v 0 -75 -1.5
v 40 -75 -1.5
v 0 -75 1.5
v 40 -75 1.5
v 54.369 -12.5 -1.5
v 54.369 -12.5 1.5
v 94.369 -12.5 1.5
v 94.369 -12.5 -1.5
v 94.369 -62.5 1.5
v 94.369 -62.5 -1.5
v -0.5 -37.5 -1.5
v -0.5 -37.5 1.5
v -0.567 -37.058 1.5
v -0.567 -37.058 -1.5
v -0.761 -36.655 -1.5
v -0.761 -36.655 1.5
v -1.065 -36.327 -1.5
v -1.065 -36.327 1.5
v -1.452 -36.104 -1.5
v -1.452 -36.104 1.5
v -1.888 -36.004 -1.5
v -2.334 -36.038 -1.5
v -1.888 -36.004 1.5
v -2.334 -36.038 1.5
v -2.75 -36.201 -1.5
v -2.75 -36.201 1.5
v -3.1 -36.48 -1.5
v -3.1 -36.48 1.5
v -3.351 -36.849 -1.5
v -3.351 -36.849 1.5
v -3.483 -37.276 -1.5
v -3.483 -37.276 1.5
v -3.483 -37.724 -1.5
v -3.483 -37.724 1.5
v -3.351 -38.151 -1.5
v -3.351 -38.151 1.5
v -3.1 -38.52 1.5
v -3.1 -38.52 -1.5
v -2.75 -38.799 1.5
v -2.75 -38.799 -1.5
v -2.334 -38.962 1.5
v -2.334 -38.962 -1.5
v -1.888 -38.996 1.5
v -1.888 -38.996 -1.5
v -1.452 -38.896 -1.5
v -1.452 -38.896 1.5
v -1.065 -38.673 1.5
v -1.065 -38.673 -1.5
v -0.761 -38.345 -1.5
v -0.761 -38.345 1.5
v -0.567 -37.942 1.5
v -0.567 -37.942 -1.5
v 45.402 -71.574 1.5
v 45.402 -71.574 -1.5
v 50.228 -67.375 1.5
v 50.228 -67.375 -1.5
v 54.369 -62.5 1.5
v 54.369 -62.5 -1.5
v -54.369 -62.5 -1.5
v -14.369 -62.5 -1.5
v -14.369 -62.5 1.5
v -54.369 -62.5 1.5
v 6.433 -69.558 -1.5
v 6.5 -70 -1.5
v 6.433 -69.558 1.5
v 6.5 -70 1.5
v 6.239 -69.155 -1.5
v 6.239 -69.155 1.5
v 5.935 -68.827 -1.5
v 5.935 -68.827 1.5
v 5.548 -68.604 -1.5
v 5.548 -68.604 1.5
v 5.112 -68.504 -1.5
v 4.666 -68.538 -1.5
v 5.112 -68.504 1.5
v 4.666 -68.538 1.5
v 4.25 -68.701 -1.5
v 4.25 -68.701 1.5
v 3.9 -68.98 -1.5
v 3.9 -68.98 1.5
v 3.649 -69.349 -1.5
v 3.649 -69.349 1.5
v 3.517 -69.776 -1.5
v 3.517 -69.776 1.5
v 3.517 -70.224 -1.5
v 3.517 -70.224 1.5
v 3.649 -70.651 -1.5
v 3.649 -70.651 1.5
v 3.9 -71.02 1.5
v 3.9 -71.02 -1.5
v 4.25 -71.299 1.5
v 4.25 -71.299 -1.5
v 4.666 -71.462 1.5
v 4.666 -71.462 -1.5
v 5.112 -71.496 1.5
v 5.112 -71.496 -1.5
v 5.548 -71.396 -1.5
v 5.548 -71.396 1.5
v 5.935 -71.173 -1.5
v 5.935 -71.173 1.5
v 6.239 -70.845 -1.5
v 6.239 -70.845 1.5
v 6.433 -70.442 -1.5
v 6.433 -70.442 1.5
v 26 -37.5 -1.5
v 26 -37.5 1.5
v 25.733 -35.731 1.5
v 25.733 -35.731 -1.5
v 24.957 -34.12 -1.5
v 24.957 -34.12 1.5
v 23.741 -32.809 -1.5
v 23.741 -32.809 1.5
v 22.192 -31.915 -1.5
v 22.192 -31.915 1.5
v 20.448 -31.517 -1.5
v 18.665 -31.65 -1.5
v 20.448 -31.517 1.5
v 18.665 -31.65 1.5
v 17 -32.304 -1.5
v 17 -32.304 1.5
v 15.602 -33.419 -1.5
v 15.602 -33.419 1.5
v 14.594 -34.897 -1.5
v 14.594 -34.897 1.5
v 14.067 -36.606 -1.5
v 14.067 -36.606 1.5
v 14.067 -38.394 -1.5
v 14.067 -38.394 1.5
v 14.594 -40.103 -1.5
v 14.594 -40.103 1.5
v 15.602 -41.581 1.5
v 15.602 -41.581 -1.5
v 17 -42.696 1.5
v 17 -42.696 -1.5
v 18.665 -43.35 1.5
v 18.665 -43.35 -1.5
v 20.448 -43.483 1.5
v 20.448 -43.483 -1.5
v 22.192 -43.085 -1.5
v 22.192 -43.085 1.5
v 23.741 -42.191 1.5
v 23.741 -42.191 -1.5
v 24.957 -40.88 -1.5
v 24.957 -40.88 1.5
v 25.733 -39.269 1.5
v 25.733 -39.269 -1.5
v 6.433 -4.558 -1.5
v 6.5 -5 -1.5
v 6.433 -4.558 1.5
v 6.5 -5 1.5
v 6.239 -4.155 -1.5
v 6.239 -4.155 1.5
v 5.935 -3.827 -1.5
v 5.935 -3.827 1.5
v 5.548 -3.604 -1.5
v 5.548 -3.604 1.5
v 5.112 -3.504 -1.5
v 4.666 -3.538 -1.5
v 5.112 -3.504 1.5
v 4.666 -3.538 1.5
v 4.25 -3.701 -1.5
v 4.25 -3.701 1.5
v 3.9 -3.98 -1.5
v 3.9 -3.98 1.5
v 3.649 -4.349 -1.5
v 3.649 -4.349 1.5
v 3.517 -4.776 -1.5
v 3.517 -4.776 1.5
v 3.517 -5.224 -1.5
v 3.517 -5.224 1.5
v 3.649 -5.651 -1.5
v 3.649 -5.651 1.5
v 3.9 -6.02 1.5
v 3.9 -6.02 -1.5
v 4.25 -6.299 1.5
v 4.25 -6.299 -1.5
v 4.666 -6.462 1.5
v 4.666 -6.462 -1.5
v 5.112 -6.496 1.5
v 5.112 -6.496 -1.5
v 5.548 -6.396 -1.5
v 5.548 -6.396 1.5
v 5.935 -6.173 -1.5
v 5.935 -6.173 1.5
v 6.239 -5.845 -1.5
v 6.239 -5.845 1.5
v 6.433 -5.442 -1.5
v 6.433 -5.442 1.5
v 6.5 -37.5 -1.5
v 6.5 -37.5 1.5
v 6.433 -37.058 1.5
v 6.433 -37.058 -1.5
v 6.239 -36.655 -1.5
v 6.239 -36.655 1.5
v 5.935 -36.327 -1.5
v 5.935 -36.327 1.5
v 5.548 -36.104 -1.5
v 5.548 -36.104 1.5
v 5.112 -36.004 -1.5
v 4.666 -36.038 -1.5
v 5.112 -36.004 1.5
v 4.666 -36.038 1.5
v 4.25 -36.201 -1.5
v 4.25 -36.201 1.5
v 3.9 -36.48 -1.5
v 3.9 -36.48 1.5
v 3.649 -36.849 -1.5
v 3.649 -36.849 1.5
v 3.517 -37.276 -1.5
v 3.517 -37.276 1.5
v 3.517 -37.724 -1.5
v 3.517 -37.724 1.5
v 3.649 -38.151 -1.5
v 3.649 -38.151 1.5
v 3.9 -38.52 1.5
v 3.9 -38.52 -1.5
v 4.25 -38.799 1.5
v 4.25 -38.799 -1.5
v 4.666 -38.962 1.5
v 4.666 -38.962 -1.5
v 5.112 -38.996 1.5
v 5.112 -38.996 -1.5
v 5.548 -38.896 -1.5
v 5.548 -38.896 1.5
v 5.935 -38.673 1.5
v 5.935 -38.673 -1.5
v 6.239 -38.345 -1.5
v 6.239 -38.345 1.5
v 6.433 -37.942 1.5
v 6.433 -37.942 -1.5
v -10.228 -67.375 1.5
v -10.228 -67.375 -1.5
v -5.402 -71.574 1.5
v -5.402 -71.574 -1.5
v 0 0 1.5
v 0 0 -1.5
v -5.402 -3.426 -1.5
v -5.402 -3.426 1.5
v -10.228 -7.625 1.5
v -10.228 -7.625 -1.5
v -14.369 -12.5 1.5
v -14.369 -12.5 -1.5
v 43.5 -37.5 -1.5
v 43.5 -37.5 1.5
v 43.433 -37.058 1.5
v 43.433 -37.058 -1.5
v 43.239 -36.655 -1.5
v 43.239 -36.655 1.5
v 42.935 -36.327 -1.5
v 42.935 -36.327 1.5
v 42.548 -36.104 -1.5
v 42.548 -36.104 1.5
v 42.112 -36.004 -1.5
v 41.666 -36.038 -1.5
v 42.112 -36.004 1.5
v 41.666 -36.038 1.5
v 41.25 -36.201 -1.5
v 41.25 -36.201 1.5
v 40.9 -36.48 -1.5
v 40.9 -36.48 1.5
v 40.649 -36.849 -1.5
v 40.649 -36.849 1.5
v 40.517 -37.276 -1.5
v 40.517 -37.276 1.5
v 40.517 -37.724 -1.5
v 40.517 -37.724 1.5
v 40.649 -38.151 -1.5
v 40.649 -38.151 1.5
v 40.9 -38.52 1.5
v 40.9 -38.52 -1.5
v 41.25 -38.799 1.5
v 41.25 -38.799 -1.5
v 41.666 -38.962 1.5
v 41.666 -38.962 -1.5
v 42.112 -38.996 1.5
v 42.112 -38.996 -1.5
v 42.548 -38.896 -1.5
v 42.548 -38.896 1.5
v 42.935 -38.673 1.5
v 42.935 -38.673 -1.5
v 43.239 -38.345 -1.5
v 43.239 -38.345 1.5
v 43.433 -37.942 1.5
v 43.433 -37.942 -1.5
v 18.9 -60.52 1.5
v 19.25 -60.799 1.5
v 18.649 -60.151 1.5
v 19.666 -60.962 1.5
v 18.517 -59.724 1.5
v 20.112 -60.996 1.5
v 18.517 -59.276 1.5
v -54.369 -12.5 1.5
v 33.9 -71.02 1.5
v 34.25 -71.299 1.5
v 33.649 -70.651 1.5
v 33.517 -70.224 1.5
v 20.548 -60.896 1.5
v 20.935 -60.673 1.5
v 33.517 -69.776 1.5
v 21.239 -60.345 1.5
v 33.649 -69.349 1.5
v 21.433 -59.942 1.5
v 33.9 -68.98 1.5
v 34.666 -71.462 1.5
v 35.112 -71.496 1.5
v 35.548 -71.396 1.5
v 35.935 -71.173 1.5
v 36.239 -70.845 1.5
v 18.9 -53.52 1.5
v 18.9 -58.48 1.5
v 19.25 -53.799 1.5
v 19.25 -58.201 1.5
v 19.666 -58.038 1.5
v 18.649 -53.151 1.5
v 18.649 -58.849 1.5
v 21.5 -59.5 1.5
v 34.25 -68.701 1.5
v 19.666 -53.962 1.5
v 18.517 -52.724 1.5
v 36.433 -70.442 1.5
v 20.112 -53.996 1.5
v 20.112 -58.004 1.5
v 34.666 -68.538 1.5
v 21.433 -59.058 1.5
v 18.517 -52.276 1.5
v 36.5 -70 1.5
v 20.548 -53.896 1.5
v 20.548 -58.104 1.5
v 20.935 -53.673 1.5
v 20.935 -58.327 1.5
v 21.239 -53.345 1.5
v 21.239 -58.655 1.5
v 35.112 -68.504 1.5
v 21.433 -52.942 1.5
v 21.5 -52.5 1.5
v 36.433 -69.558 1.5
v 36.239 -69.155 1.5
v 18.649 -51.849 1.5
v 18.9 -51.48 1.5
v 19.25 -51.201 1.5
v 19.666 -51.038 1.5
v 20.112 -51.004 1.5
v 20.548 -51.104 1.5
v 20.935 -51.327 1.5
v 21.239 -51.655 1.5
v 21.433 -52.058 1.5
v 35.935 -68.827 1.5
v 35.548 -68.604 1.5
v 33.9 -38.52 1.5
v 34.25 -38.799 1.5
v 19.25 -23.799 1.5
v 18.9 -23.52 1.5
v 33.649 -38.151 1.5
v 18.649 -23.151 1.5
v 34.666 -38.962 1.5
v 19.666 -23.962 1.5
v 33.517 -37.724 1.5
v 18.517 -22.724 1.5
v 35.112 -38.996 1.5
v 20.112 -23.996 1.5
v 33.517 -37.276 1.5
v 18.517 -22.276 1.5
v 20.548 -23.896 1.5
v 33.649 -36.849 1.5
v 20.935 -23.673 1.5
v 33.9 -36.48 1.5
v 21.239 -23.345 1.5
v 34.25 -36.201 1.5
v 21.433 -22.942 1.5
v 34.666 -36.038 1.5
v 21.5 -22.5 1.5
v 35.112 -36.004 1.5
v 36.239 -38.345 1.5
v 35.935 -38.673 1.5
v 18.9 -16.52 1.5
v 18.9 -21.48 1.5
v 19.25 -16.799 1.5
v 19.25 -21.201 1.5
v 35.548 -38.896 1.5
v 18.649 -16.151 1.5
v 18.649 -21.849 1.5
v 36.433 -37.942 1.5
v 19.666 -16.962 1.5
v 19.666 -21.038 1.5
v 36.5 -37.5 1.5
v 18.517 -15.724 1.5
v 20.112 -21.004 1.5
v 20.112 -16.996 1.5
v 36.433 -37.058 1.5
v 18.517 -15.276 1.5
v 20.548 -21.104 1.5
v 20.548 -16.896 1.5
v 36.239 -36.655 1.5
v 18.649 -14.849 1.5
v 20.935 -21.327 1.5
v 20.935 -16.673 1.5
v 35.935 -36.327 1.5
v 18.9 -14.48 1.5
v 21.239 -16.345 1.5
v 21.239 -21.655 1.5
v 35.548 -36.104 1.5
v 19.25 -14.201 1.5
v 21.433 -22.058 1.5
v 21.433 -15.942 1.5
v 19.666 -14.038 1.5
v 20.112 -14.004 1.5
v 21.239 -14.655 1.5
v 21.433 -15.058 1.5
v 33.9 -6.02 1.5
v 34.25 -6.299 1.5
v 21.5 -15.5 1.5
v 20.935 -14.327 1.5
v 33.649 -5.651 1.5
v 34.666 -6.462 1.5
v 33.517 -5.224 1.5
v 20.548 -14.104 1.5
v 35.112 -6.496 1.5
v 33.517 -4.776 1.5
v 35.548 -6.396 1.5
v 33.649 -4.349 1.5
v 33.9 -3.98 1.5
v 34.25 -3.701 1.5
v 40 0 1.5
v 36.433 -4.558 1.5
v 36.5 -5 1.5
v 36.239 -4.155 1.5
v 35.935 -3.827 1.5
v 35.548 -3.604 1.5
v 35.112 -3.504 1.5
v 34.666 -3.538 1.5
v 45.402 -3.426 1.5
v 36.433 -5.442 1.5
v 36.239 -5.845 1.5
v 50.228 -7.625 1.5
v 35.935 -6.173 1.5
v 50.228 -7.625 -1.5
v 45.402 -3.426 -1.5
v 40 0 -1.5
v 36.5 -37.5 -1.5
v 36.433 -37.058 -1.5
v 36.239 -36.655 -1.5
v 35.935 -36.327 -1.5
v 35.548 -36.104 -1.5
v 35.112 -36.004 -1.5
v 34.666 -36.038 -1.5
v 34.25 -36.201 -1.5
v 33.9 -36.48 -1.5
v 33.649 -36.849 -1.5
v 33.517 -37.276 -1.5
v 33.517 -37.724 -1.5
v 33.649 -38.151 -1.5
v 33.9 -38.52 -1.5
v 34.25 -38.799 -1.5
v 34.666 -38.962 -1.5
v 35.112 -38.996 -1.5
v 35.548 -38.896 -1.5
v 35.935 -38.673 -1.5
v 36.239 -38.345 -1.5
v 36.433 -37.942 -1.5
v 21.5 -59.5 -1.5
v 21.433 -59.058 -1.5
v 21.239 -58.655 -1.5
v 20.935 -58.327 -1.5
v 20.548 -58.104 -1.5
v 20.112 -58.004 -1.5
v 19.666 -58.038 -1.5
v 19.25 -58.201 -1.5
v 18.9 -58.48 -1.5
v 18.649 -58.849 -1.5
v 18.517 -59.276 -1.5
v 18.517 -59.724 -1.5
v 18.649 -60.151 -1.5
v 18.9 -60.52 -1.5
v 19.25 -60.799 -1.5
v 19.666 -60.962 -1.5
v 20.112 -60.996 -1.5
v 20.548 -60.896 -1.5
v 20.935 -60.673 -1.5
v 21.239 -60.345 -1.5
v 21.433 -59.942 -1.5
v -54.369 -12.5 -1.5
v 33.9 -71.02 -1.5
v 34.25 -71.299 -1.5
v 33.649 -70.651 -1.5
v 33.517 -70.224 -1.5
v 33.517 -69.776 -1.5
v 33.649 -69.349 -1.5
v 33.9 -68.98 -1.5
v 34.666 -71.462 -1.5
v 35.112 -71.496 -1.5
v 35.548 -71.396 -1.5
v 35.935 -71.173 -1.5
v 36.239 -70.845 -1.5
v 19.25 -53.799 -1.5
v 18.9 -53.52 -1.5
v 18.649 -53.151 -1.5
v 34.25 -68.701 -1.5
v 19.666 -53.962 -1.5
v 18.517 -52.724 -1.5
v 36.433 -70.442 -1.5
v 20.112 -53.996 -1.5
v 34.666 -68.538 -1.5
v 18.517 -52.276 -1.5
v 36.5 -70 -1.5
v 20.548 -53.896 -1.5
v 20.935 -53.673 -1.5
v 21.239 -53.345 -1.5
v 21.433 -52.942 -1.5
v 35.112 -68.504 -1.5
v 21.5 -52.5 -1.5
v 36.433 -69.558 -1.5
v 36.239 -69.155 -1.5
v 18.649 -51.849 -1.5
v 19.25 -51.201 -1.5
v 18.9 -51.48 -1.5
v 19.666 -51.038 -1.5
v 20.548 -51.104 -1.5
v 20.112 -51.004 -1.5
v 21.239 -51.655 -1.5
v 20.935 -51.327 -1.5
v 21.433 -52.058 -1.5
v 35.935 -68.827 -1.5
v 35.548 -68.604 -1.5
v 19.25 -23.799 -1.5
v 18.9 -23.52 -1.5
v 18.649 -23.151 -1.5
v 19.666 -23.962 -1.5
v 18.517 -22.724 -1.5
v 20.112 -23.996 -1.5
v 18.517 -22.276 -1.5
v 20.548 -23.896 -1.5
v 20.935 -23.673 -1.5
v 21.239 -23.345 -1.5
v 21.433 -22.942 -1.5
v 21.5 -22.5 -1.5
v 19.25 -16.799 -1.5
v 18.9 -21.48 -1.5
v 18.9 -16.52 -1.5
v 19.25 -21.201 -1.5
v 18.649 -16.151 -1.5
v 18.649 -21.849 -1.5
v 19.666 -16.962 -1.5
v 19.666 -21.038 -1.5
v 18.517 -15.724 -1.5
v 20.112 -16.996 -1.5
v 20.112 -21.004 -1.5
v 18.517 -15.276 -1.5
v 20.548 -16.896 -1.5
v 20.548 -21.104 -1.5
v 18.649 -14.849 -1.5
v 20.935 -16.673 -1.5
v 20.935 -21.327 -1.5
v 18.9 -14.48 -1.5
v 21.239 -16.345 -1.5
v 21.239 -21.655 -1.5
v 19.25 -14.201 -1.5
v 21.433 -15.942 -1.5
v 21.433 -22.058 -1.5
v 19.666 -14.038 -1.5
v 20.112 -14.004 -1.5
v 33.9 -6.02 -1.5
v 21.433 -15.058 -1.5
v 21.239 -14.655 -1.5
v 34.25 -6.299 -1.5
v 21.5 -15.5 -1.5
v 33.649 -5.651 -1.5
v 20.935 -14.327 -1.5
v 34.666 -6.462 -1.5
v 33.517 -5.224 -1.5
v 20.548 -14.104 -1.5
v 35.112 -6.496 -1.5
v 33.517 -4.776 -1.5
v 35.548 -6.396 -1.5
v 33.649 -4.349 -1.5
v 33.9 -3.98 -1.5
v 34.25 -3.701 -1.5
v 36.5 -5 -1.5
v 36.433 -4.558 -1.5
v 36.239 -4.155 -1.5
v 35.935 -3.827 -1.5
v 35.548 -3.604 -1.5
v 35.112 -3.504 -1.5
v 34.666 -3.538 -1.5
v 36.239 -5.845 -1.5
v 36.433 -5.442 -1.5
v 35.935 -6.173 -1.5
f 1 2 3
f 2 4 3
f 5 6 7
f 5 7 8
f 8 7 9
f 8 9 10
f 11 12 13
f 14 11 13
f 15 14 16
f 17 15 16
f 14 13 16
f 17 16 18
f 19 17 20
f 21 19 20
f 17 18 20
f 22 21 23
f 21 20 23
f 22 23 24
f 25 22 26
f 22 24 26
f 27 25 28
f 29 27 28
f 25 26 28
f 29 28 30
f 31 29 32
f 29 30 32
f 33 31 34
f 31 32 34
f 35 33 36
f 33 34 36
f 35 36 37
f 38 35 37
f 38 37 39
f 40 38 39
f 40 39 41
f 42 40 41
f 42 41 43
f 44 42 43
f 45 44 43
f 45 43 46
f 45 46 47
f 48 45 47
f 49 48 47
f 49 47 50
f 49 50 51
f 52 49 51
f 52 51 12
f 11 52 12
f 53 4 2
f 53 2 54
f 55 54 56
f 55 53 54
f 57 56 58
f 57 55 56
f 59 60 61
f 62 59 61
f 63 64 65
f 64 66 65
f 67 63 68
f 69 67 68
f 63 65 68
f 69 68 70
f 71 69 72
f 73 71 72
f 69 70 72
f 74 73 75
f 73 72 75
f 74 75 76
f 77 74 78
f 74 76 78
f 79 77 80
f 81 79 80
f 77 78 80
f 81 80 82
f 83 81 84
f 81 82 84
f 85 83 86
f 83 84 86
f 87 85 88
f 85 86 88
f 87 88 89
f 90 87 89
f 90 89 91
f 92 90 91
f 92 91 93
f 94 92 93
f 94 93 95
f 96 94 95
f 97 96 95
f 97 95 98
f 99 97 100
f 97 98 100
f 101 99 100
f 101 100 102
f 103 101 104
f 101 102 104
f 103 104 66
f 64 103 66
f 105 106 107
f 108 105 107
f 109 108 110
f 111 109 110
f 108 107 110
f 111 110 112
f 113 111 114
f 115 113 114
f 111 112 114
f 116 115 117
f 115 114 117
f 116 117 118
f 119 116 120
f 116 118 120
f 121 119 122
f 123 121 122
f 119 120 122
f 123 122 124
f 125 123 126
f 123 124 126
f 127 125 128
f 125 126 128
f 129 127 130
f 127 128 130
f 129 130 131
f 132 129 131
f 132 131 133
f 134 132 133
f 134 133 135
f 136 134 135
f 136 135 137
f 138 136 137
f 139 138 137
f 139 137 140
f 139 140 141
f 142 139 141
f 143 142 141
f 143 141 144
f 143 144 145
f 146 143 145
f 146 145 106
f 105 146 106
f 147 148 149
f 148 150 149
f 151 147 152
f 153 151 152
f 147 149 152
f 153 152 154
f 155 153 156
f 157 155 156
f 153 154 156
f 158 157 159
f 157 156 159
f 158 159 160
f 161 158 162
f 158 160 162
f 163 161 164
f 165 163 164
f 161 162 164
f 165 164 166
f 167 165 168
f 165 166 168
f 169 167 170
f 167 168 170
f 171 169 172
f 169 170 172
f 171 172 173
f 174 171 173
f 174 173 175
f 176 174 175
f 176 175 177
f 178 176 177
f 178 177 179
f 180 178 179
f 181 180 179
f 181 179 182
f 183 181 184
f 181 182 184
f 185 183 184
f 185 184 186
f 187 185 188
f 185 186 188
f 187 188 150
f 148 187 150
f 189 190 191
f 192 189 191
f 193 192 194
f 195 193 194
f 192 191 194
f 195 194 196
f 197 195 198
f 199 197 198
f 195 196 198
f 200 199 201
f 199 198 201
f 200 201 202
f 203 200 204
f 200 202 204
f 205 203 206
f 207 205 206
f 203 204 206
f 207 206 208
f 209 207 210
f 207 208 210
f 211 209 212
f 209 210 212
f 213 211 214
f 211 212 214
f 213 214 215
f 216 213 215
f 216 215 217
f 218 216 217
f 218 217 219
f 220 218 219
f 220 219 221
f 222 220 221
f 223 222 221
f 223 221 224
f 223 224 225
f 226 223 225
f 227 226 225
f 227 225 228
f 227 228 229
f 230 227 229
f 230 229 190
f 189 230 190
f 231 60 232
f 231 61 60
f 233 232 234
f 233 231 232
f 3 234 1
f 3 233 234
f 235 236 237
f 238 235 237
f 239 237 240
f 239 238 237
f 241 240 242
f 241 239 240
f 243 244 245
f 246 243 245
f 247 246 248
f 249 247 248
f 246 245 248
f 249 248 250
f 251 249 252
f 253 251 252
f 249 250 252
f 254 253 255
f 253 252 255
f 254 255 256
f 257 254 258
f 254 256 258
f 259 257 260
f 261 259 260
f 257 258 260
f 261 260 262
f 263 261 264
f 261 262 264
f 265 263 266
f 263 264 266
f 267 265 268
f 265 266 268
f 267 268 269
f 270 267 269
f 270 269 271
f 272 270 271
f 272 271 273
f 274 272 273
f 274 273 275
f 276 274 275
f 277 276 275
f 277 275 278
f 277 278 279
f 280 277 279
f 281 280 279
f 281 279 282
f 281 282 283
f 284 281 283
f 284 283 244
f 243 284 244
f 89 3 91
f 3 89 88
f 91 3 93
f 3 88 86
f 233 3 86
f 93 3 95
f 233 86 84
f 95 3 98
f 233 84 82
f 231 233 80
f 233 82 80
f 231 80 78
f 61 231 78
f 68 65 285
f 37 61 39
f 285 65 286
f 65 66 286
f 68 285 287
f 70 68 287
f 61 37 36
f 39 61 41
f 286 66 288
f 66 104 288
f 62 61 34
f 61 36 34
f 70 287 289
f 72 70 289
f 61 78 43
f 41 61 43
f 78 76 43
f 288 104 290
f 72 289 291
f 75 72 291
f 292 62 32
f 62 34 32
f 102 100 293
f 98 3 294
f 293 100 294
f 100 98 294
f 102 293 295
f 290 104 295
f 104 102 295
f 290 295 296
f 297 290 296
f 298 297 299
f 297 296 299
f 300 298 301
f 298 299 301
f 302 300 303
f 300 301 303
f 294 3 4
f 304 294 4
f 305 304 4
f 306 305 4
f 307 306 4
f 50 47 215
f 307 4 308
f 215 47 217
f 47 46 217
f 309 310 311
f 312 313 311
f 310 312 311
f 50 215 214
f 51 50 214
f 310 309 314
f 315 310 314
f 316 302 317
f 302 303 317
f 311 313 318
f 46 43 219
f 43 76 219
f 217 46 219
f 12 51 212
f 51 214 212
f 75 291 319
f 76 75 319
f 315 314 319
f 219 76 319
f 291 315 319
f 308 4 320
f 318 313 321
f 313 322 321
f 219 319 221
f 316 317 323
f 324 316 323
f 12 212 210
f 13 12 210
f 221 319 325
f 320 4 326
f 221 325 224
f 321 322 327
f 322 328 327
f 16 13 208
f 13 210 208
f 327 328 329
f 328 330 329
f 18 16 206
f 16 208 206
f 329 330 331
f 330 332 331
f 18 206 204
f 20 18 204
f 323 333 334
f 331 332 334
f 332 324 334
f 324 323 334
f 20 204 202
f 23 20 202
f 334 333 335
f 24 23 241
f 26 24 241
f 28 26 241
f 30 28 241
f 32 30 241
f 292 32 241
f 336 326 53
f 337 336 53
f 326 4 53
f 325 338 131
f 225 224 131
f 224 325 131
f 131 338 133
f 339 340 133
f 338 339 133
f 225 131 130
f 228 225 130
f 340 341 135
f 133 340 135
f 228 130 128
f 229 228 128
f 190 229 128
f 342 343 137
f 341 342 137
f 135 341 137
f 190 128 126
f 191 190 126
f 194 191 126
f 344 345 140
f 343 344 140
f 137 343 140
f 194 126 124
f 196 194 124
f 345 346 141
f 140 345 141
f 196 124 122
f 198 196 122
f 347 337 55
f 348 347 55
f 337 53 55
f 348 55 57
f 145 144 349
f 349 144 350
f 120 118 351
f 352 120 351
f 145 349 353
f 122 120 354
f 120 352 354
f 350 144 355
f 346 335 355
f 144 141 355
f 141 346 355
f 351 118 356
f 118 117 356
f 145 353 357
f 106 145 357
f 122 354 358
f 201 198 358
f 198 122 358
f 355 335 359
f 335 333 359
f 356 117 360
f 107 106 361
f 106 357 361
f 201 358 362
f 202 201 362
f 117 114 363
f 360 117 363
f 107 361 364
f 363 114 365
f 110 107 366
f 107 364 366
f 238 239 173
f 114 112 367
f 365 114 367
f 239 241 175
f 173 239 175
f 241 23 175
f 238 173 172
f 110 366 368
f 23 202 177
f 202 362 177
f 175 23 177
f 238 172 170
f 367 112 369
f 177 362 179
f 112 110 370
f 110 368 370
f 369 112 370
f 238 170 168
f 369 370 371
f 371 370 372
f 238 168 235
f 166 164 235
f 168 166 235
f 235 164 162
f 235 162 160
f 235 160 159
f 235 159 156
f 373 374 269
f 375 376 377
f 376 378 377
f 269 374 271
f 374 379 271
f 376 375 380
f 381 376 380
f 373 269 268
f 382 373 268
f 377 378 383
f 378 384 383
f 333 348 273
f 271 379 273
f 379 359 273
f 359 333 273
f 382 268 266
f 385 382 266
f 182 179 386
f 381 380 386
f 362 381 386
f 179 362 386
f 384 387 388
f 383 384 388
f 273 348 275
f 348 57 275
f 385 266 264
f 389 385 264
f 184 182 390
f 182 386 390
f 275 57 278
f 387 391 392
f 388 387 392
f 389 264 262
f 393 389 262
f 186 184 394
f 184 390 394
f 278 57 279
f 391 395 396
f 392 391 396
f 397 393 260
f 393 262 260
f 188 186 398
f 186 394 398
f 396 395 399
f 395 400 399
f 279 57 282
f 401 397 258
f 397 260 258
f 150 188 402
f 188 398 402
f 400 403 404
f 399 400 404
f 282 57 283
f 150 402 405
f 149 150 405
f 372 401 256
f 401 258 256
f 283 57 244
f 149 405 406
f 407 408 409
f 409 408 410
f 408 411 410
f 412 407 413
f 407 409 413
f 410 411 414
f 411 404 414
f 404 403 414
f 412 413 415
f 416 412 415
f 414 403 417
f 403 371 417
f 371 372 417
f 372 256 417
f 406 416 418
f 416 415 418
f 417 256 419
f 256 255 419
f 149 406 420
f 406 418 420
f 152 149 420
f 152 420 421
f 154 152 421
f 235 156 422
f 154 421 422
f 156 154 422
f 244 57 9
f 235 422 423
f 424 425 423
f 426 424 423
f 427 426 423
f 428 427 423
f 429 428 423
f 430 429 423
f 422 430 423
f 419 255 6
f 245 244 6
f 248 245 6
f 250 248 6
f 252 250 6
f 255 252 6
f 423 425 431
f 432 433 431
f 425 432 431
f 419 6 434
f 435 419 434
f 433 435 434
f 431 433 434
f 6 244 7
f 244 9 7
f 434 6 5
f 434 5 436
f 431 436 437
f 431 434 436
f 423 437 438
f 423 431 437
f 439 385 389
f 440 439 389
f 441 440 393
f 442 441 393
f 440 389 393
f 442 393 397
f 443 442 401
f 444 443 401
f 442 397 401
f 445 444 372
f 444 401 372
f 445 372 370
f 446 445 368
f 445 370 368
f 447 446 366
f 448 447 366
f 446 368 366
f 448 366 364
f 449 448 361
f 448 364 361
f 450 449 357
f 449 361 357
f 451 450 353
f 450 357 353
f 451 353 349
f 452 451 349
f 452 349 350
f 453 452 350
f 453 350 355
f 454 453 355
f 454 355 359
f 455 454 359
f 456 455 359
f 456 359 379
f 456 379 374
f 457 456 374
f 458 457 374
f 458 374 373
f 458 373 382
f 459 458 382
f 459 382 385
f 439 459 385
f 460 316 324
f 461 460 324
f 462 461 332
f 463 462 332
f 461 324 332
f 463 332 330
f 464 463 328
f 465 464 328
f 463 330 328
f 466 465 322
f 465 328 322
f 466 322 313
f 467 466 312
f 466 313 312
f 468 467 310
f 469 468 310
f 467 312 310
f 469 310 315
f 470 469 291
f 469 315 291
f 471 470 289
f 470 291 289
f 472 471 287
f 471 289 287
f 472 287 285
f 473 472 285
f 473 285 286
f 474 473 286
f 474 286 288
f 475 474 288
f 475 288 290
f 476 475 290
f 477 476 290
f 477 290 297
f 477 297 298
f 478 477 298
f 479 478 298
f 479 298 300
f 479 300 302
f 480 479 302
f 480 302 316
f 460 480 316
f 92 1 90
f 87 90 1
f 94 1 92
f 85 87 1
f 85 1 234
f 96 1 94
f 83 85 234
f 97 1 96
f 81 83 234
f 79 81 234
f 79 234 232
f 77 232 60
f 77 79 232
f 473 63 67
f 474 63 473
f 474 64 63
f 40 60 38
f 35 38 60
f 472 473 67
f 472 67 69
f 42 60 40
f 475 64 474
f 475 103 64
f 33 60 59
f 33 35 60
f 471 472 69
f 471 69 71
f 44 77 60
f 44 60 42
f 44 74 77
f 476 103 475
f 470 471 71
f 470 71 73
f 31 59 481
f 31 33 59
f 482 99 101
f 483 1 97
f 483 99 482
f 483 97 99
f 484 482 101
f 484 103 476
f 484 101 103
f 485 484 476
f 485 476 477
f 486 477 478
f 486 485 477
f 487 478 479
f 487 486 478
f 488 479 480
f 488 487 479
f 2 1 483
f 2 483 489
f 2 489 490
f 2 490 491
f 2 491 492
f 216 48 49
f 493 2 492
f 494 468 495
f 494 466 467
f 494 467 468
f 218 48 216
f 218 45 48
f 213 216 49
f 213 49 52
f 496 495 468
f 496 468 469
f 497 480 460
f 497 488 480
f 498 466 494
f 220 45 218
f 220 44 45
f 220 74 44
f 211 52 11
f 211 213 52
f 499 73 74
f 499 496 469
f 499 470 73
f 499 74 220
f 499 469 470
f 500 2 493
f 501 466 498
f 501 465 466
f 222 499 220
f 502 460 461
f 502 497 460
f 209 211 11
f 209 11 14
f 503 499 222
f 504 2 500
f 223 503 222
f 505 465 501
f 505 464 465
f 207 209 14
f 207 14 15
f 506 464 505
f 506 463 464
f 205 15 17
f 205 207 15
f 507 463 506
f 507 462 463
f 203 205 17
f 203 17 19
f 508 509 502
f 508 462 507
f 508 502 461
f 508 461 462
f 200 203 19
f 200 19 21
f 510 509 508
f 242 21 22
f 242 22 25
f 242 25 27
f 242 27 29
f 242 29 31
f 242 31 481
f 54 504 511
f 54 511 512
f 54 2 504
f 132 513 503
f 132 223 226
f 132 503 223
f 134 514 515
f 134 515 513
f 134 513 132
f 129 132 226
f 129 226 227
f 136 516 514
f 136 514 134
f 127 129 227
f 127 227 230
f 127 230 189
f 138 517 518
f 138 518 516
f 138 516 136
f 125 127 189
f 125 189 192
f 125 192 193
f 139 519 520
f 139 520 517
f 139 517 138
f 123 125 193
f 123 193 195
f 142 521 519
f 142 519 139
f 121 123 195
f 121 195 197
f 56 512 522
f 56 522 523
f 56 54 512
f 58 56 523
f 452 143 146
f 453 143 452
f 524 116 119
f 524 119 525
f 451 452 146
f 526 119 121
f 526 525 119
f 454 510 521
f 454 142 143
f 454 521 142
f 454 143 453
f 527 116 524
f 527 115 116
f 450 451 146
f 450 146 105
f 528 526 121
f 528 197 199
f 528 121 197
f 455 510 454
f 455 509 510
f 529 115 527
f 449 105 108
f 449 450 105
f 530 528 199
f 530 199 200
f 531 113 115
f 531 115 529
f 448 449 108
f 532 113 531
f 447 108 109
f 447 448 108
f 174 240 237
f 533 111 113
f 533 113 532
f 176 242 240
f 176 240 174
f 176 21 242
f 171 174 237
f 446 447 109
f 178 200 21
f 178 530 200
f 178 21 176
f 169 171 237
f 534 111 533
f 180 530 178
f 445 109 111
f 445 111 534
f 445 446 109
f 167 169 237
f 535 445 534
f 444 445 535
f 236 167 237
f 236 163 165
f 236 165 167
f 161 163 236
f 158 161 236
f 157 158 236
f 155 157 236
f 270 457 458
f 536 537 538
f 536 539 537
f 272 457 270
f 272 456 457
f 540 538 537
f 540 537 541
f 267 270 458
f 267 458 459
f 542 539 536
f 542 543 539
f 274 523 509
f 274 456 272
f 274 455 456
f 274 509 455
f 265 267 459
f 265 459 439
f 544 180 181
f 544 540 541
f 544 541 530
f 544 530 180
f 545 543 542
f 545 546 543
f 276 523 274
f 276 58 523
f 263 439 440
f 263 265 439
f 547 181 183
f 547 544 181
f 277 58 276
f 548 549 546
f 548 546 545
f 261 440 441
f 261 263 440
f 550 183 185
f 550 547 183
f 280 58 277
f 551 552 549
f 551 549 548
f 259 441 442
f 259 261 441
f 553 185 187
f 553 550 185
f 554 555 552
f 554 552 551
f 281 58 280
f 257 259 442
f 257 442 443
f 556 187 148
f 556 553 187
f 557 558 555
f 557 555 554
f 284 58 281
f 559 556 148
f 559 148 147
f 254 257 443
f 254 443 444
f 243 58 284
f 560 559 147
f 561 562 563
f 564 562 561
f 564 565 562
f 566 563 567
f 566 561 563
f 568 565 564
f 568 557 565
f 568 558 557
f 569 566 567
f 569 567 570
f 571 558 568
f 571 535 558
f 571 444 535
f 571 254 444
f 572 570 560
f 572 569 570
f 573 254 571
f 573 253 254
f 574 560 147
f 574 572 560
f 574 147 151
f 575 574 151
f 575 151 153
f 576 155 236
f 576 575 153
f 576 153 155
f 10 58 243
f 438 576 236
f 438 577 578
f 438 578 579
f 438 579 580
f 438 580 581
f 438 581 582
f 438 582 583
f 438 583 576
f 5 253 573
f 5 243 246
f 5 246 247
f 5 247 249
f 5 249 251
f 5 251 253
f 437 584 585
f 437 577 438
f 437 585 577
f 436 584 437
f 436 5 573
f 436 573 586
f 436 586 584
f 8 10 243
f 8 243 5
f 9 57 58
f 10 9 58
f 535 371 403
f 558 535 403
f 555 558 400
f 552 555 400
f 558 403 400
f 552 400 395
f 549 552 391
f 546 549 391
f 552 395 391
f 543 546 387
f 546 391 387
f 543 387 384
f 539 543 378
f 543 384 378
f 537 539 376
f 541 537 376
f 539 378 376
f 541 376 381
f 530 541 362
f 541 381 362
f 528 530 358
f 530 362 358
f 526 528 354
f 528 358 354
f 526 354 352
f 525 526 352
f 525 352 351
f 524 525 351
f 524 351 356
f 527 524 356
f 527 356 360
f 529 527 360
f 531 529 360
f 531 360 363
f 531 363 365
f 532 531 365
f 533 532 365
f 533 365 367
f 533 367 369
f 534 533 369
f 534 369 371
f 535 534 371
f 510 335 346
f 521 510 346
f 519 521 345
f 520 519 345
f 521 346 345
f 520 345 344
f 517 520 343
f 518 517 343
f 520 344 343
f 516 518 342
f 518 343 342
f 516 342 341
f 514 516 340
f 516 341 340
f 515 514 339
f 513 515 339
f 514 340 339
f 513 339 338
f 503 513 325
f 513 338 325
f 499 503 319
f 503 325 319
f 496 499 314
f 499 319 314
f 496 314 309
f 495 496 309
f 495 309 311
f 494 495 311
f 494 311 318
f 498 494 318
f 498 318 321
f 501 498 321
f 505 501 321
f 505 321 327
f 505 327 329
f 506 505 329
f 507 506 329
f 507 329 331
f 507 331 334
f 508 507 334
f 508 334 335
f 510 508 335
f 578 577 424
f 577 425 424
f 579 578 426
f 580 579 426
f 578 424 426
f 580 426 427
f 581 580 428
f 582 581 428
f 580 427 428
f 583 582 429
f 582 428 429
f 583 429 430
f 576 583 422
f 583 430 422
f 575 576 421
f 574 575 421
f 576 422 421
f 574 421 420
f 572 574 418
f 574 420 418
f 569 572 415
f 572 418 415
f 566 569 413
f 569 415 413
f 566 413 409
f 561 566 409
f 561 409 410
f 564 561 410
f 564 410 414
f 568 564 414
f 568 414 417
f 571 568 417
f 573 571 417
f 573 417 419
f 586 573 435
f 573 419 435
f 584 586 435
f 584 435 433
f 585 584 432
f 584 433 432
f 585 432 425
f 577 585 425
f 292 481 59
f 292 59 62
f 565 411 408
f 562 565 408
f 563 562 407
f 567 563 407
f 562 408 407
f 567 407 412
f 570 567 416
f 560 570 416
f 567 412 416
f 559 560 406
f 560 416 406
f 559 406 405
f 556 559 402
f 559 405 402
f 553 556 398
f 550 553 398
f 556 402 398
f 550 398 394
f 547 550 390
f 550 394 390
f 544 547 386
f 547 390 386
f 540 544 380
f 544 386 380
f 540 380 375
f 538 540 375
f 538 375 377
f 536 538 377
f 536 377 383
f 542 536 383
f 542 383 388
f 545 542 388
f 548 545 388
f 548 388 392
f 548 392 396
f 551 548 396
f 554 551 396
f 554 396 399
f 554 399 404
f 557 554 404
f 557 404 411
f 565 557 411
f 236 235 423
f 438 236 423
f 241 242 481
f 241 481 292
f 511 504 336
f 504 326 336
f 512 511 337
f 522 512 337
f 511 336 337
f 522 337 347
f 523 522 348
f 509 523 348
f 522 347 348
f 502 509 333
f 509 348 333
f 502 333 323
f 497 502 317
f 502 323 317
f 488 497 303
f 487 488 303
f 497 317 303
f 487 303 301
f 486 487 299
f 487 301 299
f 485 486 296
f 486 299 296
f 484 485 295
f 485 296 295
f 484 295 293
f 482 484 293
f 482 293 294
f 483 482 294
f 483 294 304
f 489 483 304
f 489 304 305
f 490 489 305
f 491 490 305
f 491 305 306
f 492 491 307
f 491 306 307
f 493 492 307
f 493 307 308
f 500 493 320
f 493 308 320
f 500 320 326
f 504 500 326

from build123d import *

# Parameters (mm, degrees)
SKETCH_1_R           = 42.5
EXTRUDE_7_DEPTH      = 1.5
CUT_EXTRUDE_24_DEPTH = 1.5
CUT_EXTRUDE_25_DEPTH = 1.5
SKETCH_1_14_R        = 1.5
CUT_EXTRUDE_26_DEPTH = 1.5
SKETCH_1_15_R        = 1.5
CUT_EXTRUDE_27_DEPTH = 1.5
SKETCH_1_16_R        = 1.5
CUT_EXTRUDE_28_DEPTH = 1.5
SKETCH_1_17_R        = 1.5
CUT_EXTRUDE_29_DEPTH = 1.5
SKETCH_10_R          = 1.5
CUT_EXTRUDE_31_DEPTH = 98.67420335
SKETCH_11_R          = 6
CUT_EXTRUDE_32_DEPTH = 98.67420335
CUT_EXTRUDE_35_DEPTH = 5
SKETCH_41_W          = 3
SKETCH_41_H          = 50
EXTRUDE_14_DEPTH     = 40
SKETCH_42_W          = 3
SKETCH_42_H          = 50
EXTRUDE_15_DEPTH     = 40


with BuildPart() as part:
    # 草图1 → 凸台-拉伸7 (new, symmetric)
    with BuildSketch(Plane.XY):
        with Locations((20, -37.5)):
            Circle(SKETCH_1_R)
    extrude(amount=EXTRUDE_7_DEPTH, both=True)

    # 草图1<12> → 切除-拉伸24 (cut, symmetric)
    with BuildSketch(Plane.XY):
        with BuildLine():
            ThreePointArc((40, 0), (20, 5), (0, 0))
            Line((0, 0), (40, 0))
        make_face()
    extrude(amount=CUT_EXTRUDE_24_DEPTH, both=True, mode=Mode.SUBTRACT)

    # 草图1<13> → 切除-拉伸25 (cut, symmetric)
    with BuildSketch(Plane.XY):
        with BuildLine():
            Line((40, -75), (0, -75))
            ThreePointArc((0, -75), (20, -80), (40, -75))
        make_face()
    extrude(amount=CUT_EXTRUDE_25_DEPTH, both=True, mode=Mode.SUBTRACT)

    # 草图1<14> → 切除-拉伸26 (cut, symmetric)
    with BuildSketch(Plane.XY):
        with Locations((5, -5)):
            Circle(SKETCH_1_14_R)
    extrude(amount=CUT_EXTRUDE_26_DEPTH, both=True, mode=Mode.SUBTRACT)

    # 草图1<15> → 切除-拉伸27 (cut, symmetric)
    with BuildSketch(Plane.XY):
        with Locations((35, -5)):
            Circle(SKETCH_1_15_R)
    extrude(amount=CUT_EXTRUDE_27_DEPTH, both=True, mode=Mode.SUBTRACT)

    # 草图1<16> → 切除-拉伸28 (cut, symmetric)
    with BuildSketch(Plane.XY):
        with Locations((5, -70)):
            Circle(SKETCH_1_16_R)
    extrude(amount=CUT_EXTRUDE_28_DEPTH, both=True, mode=Mode.SUBTRACT)

    # 草图1<17> → 切除-拉伸29 (cut, symmetric)
    with BuildSketch(Plane.XY):
        with Locations((35, -70)):
            Circle(SKETCH_1_17_R)
    extrude(amount=CUT_EXTRUDE_29_DEPTH, both=True, mode=Mode.SUBTRACT)

    # 草图10 → 切除-拉伸31 (cut, through all)
    with BuildSketch(Plane.XY.offset(1.5)):
        with Locations((20, -15.5)):
            Circle(SKETCH_10_R)
        with Locations((-2, -37.5)):
            Circle(SKETCH_10_R)
        with Locations((42, -37.5)):
            Circle(SKETCH_10_R)
        with Locations((20, -59.5)):
            Circle(SKETCH_10_R)
        with Locations((20, -22.5)):
            Circle(SKETCH_10_R)
        with Locations((5, -37.5)):
            Circle(SKETCH_10_R)
        with Locations((20, -52.5)):
            Circle(SKETCH_10_R)
        with Locations((35, -37.5)):
            Circle(SKETCH_10_R)
    extrude(amount=-CUT_EXTRUDE_31_DEPTH, mode=Mode.SUBTRACT)

    # 草图11 → 切除-拉伸32 (cut, through all)
    with BuildSketch(Plane.XY.offset(1.5)):
        with Locations((20, -37.5)):
            Circle(SKETCH_11_R)
    extrude(amount=-CUT_EXTRUDE_32_DEPTH, mode=Mode.SUBTRACT)

    # 草图19 → 切除-拉伸35 (cut, symmetric)
    with BuildSketch(Plane.XY.offset(1.5)):
        with BuildLine():
            Line((-14.369317712, -62.5), (-14.369317712, -12.5))
            ThreePointArc((-14.369317712, -12.5), (-22.5, -37.5), (-14.369317712, -62.5))
        make_face()
        with BuildLine():
            ThreePointArc((54.369317712, -62.5), (62.5, -37.5), (54.369317712, -12.5))
            Line((54.369317712, -12.5), (54.369317712, -62.5))
        make_face()
    extrude(amount=CUT_EXTRUDE_35_DEPTH, both=True, mode=Mode.SUBTRACT)

    # 草图41 → 凸台-拉伸14 (add)
    with BuildSketch(Plane(origin=(54.369317712, 0, 0), x_dir=(0, 0, -1), z_dir=(1, 0, 0))):
        with Locations((0, -37.5)):
            Rectangle(SKETCH_41_W, SKETCH_41_H)
    extrude(amount=EXTRUDE_14_DEPTH)

    # 草图42 → 凸台-拉伸15 (add)
    with BuildSketch(Plane.ZY.offset(14.369317712)):
        with Locations((0, -37.5)):
            Rectangle(SKETCH_42_W, SKETCH_42_H)
    extrude(amount=EXTRUDE_15_DEPTH)


solid = part.part
